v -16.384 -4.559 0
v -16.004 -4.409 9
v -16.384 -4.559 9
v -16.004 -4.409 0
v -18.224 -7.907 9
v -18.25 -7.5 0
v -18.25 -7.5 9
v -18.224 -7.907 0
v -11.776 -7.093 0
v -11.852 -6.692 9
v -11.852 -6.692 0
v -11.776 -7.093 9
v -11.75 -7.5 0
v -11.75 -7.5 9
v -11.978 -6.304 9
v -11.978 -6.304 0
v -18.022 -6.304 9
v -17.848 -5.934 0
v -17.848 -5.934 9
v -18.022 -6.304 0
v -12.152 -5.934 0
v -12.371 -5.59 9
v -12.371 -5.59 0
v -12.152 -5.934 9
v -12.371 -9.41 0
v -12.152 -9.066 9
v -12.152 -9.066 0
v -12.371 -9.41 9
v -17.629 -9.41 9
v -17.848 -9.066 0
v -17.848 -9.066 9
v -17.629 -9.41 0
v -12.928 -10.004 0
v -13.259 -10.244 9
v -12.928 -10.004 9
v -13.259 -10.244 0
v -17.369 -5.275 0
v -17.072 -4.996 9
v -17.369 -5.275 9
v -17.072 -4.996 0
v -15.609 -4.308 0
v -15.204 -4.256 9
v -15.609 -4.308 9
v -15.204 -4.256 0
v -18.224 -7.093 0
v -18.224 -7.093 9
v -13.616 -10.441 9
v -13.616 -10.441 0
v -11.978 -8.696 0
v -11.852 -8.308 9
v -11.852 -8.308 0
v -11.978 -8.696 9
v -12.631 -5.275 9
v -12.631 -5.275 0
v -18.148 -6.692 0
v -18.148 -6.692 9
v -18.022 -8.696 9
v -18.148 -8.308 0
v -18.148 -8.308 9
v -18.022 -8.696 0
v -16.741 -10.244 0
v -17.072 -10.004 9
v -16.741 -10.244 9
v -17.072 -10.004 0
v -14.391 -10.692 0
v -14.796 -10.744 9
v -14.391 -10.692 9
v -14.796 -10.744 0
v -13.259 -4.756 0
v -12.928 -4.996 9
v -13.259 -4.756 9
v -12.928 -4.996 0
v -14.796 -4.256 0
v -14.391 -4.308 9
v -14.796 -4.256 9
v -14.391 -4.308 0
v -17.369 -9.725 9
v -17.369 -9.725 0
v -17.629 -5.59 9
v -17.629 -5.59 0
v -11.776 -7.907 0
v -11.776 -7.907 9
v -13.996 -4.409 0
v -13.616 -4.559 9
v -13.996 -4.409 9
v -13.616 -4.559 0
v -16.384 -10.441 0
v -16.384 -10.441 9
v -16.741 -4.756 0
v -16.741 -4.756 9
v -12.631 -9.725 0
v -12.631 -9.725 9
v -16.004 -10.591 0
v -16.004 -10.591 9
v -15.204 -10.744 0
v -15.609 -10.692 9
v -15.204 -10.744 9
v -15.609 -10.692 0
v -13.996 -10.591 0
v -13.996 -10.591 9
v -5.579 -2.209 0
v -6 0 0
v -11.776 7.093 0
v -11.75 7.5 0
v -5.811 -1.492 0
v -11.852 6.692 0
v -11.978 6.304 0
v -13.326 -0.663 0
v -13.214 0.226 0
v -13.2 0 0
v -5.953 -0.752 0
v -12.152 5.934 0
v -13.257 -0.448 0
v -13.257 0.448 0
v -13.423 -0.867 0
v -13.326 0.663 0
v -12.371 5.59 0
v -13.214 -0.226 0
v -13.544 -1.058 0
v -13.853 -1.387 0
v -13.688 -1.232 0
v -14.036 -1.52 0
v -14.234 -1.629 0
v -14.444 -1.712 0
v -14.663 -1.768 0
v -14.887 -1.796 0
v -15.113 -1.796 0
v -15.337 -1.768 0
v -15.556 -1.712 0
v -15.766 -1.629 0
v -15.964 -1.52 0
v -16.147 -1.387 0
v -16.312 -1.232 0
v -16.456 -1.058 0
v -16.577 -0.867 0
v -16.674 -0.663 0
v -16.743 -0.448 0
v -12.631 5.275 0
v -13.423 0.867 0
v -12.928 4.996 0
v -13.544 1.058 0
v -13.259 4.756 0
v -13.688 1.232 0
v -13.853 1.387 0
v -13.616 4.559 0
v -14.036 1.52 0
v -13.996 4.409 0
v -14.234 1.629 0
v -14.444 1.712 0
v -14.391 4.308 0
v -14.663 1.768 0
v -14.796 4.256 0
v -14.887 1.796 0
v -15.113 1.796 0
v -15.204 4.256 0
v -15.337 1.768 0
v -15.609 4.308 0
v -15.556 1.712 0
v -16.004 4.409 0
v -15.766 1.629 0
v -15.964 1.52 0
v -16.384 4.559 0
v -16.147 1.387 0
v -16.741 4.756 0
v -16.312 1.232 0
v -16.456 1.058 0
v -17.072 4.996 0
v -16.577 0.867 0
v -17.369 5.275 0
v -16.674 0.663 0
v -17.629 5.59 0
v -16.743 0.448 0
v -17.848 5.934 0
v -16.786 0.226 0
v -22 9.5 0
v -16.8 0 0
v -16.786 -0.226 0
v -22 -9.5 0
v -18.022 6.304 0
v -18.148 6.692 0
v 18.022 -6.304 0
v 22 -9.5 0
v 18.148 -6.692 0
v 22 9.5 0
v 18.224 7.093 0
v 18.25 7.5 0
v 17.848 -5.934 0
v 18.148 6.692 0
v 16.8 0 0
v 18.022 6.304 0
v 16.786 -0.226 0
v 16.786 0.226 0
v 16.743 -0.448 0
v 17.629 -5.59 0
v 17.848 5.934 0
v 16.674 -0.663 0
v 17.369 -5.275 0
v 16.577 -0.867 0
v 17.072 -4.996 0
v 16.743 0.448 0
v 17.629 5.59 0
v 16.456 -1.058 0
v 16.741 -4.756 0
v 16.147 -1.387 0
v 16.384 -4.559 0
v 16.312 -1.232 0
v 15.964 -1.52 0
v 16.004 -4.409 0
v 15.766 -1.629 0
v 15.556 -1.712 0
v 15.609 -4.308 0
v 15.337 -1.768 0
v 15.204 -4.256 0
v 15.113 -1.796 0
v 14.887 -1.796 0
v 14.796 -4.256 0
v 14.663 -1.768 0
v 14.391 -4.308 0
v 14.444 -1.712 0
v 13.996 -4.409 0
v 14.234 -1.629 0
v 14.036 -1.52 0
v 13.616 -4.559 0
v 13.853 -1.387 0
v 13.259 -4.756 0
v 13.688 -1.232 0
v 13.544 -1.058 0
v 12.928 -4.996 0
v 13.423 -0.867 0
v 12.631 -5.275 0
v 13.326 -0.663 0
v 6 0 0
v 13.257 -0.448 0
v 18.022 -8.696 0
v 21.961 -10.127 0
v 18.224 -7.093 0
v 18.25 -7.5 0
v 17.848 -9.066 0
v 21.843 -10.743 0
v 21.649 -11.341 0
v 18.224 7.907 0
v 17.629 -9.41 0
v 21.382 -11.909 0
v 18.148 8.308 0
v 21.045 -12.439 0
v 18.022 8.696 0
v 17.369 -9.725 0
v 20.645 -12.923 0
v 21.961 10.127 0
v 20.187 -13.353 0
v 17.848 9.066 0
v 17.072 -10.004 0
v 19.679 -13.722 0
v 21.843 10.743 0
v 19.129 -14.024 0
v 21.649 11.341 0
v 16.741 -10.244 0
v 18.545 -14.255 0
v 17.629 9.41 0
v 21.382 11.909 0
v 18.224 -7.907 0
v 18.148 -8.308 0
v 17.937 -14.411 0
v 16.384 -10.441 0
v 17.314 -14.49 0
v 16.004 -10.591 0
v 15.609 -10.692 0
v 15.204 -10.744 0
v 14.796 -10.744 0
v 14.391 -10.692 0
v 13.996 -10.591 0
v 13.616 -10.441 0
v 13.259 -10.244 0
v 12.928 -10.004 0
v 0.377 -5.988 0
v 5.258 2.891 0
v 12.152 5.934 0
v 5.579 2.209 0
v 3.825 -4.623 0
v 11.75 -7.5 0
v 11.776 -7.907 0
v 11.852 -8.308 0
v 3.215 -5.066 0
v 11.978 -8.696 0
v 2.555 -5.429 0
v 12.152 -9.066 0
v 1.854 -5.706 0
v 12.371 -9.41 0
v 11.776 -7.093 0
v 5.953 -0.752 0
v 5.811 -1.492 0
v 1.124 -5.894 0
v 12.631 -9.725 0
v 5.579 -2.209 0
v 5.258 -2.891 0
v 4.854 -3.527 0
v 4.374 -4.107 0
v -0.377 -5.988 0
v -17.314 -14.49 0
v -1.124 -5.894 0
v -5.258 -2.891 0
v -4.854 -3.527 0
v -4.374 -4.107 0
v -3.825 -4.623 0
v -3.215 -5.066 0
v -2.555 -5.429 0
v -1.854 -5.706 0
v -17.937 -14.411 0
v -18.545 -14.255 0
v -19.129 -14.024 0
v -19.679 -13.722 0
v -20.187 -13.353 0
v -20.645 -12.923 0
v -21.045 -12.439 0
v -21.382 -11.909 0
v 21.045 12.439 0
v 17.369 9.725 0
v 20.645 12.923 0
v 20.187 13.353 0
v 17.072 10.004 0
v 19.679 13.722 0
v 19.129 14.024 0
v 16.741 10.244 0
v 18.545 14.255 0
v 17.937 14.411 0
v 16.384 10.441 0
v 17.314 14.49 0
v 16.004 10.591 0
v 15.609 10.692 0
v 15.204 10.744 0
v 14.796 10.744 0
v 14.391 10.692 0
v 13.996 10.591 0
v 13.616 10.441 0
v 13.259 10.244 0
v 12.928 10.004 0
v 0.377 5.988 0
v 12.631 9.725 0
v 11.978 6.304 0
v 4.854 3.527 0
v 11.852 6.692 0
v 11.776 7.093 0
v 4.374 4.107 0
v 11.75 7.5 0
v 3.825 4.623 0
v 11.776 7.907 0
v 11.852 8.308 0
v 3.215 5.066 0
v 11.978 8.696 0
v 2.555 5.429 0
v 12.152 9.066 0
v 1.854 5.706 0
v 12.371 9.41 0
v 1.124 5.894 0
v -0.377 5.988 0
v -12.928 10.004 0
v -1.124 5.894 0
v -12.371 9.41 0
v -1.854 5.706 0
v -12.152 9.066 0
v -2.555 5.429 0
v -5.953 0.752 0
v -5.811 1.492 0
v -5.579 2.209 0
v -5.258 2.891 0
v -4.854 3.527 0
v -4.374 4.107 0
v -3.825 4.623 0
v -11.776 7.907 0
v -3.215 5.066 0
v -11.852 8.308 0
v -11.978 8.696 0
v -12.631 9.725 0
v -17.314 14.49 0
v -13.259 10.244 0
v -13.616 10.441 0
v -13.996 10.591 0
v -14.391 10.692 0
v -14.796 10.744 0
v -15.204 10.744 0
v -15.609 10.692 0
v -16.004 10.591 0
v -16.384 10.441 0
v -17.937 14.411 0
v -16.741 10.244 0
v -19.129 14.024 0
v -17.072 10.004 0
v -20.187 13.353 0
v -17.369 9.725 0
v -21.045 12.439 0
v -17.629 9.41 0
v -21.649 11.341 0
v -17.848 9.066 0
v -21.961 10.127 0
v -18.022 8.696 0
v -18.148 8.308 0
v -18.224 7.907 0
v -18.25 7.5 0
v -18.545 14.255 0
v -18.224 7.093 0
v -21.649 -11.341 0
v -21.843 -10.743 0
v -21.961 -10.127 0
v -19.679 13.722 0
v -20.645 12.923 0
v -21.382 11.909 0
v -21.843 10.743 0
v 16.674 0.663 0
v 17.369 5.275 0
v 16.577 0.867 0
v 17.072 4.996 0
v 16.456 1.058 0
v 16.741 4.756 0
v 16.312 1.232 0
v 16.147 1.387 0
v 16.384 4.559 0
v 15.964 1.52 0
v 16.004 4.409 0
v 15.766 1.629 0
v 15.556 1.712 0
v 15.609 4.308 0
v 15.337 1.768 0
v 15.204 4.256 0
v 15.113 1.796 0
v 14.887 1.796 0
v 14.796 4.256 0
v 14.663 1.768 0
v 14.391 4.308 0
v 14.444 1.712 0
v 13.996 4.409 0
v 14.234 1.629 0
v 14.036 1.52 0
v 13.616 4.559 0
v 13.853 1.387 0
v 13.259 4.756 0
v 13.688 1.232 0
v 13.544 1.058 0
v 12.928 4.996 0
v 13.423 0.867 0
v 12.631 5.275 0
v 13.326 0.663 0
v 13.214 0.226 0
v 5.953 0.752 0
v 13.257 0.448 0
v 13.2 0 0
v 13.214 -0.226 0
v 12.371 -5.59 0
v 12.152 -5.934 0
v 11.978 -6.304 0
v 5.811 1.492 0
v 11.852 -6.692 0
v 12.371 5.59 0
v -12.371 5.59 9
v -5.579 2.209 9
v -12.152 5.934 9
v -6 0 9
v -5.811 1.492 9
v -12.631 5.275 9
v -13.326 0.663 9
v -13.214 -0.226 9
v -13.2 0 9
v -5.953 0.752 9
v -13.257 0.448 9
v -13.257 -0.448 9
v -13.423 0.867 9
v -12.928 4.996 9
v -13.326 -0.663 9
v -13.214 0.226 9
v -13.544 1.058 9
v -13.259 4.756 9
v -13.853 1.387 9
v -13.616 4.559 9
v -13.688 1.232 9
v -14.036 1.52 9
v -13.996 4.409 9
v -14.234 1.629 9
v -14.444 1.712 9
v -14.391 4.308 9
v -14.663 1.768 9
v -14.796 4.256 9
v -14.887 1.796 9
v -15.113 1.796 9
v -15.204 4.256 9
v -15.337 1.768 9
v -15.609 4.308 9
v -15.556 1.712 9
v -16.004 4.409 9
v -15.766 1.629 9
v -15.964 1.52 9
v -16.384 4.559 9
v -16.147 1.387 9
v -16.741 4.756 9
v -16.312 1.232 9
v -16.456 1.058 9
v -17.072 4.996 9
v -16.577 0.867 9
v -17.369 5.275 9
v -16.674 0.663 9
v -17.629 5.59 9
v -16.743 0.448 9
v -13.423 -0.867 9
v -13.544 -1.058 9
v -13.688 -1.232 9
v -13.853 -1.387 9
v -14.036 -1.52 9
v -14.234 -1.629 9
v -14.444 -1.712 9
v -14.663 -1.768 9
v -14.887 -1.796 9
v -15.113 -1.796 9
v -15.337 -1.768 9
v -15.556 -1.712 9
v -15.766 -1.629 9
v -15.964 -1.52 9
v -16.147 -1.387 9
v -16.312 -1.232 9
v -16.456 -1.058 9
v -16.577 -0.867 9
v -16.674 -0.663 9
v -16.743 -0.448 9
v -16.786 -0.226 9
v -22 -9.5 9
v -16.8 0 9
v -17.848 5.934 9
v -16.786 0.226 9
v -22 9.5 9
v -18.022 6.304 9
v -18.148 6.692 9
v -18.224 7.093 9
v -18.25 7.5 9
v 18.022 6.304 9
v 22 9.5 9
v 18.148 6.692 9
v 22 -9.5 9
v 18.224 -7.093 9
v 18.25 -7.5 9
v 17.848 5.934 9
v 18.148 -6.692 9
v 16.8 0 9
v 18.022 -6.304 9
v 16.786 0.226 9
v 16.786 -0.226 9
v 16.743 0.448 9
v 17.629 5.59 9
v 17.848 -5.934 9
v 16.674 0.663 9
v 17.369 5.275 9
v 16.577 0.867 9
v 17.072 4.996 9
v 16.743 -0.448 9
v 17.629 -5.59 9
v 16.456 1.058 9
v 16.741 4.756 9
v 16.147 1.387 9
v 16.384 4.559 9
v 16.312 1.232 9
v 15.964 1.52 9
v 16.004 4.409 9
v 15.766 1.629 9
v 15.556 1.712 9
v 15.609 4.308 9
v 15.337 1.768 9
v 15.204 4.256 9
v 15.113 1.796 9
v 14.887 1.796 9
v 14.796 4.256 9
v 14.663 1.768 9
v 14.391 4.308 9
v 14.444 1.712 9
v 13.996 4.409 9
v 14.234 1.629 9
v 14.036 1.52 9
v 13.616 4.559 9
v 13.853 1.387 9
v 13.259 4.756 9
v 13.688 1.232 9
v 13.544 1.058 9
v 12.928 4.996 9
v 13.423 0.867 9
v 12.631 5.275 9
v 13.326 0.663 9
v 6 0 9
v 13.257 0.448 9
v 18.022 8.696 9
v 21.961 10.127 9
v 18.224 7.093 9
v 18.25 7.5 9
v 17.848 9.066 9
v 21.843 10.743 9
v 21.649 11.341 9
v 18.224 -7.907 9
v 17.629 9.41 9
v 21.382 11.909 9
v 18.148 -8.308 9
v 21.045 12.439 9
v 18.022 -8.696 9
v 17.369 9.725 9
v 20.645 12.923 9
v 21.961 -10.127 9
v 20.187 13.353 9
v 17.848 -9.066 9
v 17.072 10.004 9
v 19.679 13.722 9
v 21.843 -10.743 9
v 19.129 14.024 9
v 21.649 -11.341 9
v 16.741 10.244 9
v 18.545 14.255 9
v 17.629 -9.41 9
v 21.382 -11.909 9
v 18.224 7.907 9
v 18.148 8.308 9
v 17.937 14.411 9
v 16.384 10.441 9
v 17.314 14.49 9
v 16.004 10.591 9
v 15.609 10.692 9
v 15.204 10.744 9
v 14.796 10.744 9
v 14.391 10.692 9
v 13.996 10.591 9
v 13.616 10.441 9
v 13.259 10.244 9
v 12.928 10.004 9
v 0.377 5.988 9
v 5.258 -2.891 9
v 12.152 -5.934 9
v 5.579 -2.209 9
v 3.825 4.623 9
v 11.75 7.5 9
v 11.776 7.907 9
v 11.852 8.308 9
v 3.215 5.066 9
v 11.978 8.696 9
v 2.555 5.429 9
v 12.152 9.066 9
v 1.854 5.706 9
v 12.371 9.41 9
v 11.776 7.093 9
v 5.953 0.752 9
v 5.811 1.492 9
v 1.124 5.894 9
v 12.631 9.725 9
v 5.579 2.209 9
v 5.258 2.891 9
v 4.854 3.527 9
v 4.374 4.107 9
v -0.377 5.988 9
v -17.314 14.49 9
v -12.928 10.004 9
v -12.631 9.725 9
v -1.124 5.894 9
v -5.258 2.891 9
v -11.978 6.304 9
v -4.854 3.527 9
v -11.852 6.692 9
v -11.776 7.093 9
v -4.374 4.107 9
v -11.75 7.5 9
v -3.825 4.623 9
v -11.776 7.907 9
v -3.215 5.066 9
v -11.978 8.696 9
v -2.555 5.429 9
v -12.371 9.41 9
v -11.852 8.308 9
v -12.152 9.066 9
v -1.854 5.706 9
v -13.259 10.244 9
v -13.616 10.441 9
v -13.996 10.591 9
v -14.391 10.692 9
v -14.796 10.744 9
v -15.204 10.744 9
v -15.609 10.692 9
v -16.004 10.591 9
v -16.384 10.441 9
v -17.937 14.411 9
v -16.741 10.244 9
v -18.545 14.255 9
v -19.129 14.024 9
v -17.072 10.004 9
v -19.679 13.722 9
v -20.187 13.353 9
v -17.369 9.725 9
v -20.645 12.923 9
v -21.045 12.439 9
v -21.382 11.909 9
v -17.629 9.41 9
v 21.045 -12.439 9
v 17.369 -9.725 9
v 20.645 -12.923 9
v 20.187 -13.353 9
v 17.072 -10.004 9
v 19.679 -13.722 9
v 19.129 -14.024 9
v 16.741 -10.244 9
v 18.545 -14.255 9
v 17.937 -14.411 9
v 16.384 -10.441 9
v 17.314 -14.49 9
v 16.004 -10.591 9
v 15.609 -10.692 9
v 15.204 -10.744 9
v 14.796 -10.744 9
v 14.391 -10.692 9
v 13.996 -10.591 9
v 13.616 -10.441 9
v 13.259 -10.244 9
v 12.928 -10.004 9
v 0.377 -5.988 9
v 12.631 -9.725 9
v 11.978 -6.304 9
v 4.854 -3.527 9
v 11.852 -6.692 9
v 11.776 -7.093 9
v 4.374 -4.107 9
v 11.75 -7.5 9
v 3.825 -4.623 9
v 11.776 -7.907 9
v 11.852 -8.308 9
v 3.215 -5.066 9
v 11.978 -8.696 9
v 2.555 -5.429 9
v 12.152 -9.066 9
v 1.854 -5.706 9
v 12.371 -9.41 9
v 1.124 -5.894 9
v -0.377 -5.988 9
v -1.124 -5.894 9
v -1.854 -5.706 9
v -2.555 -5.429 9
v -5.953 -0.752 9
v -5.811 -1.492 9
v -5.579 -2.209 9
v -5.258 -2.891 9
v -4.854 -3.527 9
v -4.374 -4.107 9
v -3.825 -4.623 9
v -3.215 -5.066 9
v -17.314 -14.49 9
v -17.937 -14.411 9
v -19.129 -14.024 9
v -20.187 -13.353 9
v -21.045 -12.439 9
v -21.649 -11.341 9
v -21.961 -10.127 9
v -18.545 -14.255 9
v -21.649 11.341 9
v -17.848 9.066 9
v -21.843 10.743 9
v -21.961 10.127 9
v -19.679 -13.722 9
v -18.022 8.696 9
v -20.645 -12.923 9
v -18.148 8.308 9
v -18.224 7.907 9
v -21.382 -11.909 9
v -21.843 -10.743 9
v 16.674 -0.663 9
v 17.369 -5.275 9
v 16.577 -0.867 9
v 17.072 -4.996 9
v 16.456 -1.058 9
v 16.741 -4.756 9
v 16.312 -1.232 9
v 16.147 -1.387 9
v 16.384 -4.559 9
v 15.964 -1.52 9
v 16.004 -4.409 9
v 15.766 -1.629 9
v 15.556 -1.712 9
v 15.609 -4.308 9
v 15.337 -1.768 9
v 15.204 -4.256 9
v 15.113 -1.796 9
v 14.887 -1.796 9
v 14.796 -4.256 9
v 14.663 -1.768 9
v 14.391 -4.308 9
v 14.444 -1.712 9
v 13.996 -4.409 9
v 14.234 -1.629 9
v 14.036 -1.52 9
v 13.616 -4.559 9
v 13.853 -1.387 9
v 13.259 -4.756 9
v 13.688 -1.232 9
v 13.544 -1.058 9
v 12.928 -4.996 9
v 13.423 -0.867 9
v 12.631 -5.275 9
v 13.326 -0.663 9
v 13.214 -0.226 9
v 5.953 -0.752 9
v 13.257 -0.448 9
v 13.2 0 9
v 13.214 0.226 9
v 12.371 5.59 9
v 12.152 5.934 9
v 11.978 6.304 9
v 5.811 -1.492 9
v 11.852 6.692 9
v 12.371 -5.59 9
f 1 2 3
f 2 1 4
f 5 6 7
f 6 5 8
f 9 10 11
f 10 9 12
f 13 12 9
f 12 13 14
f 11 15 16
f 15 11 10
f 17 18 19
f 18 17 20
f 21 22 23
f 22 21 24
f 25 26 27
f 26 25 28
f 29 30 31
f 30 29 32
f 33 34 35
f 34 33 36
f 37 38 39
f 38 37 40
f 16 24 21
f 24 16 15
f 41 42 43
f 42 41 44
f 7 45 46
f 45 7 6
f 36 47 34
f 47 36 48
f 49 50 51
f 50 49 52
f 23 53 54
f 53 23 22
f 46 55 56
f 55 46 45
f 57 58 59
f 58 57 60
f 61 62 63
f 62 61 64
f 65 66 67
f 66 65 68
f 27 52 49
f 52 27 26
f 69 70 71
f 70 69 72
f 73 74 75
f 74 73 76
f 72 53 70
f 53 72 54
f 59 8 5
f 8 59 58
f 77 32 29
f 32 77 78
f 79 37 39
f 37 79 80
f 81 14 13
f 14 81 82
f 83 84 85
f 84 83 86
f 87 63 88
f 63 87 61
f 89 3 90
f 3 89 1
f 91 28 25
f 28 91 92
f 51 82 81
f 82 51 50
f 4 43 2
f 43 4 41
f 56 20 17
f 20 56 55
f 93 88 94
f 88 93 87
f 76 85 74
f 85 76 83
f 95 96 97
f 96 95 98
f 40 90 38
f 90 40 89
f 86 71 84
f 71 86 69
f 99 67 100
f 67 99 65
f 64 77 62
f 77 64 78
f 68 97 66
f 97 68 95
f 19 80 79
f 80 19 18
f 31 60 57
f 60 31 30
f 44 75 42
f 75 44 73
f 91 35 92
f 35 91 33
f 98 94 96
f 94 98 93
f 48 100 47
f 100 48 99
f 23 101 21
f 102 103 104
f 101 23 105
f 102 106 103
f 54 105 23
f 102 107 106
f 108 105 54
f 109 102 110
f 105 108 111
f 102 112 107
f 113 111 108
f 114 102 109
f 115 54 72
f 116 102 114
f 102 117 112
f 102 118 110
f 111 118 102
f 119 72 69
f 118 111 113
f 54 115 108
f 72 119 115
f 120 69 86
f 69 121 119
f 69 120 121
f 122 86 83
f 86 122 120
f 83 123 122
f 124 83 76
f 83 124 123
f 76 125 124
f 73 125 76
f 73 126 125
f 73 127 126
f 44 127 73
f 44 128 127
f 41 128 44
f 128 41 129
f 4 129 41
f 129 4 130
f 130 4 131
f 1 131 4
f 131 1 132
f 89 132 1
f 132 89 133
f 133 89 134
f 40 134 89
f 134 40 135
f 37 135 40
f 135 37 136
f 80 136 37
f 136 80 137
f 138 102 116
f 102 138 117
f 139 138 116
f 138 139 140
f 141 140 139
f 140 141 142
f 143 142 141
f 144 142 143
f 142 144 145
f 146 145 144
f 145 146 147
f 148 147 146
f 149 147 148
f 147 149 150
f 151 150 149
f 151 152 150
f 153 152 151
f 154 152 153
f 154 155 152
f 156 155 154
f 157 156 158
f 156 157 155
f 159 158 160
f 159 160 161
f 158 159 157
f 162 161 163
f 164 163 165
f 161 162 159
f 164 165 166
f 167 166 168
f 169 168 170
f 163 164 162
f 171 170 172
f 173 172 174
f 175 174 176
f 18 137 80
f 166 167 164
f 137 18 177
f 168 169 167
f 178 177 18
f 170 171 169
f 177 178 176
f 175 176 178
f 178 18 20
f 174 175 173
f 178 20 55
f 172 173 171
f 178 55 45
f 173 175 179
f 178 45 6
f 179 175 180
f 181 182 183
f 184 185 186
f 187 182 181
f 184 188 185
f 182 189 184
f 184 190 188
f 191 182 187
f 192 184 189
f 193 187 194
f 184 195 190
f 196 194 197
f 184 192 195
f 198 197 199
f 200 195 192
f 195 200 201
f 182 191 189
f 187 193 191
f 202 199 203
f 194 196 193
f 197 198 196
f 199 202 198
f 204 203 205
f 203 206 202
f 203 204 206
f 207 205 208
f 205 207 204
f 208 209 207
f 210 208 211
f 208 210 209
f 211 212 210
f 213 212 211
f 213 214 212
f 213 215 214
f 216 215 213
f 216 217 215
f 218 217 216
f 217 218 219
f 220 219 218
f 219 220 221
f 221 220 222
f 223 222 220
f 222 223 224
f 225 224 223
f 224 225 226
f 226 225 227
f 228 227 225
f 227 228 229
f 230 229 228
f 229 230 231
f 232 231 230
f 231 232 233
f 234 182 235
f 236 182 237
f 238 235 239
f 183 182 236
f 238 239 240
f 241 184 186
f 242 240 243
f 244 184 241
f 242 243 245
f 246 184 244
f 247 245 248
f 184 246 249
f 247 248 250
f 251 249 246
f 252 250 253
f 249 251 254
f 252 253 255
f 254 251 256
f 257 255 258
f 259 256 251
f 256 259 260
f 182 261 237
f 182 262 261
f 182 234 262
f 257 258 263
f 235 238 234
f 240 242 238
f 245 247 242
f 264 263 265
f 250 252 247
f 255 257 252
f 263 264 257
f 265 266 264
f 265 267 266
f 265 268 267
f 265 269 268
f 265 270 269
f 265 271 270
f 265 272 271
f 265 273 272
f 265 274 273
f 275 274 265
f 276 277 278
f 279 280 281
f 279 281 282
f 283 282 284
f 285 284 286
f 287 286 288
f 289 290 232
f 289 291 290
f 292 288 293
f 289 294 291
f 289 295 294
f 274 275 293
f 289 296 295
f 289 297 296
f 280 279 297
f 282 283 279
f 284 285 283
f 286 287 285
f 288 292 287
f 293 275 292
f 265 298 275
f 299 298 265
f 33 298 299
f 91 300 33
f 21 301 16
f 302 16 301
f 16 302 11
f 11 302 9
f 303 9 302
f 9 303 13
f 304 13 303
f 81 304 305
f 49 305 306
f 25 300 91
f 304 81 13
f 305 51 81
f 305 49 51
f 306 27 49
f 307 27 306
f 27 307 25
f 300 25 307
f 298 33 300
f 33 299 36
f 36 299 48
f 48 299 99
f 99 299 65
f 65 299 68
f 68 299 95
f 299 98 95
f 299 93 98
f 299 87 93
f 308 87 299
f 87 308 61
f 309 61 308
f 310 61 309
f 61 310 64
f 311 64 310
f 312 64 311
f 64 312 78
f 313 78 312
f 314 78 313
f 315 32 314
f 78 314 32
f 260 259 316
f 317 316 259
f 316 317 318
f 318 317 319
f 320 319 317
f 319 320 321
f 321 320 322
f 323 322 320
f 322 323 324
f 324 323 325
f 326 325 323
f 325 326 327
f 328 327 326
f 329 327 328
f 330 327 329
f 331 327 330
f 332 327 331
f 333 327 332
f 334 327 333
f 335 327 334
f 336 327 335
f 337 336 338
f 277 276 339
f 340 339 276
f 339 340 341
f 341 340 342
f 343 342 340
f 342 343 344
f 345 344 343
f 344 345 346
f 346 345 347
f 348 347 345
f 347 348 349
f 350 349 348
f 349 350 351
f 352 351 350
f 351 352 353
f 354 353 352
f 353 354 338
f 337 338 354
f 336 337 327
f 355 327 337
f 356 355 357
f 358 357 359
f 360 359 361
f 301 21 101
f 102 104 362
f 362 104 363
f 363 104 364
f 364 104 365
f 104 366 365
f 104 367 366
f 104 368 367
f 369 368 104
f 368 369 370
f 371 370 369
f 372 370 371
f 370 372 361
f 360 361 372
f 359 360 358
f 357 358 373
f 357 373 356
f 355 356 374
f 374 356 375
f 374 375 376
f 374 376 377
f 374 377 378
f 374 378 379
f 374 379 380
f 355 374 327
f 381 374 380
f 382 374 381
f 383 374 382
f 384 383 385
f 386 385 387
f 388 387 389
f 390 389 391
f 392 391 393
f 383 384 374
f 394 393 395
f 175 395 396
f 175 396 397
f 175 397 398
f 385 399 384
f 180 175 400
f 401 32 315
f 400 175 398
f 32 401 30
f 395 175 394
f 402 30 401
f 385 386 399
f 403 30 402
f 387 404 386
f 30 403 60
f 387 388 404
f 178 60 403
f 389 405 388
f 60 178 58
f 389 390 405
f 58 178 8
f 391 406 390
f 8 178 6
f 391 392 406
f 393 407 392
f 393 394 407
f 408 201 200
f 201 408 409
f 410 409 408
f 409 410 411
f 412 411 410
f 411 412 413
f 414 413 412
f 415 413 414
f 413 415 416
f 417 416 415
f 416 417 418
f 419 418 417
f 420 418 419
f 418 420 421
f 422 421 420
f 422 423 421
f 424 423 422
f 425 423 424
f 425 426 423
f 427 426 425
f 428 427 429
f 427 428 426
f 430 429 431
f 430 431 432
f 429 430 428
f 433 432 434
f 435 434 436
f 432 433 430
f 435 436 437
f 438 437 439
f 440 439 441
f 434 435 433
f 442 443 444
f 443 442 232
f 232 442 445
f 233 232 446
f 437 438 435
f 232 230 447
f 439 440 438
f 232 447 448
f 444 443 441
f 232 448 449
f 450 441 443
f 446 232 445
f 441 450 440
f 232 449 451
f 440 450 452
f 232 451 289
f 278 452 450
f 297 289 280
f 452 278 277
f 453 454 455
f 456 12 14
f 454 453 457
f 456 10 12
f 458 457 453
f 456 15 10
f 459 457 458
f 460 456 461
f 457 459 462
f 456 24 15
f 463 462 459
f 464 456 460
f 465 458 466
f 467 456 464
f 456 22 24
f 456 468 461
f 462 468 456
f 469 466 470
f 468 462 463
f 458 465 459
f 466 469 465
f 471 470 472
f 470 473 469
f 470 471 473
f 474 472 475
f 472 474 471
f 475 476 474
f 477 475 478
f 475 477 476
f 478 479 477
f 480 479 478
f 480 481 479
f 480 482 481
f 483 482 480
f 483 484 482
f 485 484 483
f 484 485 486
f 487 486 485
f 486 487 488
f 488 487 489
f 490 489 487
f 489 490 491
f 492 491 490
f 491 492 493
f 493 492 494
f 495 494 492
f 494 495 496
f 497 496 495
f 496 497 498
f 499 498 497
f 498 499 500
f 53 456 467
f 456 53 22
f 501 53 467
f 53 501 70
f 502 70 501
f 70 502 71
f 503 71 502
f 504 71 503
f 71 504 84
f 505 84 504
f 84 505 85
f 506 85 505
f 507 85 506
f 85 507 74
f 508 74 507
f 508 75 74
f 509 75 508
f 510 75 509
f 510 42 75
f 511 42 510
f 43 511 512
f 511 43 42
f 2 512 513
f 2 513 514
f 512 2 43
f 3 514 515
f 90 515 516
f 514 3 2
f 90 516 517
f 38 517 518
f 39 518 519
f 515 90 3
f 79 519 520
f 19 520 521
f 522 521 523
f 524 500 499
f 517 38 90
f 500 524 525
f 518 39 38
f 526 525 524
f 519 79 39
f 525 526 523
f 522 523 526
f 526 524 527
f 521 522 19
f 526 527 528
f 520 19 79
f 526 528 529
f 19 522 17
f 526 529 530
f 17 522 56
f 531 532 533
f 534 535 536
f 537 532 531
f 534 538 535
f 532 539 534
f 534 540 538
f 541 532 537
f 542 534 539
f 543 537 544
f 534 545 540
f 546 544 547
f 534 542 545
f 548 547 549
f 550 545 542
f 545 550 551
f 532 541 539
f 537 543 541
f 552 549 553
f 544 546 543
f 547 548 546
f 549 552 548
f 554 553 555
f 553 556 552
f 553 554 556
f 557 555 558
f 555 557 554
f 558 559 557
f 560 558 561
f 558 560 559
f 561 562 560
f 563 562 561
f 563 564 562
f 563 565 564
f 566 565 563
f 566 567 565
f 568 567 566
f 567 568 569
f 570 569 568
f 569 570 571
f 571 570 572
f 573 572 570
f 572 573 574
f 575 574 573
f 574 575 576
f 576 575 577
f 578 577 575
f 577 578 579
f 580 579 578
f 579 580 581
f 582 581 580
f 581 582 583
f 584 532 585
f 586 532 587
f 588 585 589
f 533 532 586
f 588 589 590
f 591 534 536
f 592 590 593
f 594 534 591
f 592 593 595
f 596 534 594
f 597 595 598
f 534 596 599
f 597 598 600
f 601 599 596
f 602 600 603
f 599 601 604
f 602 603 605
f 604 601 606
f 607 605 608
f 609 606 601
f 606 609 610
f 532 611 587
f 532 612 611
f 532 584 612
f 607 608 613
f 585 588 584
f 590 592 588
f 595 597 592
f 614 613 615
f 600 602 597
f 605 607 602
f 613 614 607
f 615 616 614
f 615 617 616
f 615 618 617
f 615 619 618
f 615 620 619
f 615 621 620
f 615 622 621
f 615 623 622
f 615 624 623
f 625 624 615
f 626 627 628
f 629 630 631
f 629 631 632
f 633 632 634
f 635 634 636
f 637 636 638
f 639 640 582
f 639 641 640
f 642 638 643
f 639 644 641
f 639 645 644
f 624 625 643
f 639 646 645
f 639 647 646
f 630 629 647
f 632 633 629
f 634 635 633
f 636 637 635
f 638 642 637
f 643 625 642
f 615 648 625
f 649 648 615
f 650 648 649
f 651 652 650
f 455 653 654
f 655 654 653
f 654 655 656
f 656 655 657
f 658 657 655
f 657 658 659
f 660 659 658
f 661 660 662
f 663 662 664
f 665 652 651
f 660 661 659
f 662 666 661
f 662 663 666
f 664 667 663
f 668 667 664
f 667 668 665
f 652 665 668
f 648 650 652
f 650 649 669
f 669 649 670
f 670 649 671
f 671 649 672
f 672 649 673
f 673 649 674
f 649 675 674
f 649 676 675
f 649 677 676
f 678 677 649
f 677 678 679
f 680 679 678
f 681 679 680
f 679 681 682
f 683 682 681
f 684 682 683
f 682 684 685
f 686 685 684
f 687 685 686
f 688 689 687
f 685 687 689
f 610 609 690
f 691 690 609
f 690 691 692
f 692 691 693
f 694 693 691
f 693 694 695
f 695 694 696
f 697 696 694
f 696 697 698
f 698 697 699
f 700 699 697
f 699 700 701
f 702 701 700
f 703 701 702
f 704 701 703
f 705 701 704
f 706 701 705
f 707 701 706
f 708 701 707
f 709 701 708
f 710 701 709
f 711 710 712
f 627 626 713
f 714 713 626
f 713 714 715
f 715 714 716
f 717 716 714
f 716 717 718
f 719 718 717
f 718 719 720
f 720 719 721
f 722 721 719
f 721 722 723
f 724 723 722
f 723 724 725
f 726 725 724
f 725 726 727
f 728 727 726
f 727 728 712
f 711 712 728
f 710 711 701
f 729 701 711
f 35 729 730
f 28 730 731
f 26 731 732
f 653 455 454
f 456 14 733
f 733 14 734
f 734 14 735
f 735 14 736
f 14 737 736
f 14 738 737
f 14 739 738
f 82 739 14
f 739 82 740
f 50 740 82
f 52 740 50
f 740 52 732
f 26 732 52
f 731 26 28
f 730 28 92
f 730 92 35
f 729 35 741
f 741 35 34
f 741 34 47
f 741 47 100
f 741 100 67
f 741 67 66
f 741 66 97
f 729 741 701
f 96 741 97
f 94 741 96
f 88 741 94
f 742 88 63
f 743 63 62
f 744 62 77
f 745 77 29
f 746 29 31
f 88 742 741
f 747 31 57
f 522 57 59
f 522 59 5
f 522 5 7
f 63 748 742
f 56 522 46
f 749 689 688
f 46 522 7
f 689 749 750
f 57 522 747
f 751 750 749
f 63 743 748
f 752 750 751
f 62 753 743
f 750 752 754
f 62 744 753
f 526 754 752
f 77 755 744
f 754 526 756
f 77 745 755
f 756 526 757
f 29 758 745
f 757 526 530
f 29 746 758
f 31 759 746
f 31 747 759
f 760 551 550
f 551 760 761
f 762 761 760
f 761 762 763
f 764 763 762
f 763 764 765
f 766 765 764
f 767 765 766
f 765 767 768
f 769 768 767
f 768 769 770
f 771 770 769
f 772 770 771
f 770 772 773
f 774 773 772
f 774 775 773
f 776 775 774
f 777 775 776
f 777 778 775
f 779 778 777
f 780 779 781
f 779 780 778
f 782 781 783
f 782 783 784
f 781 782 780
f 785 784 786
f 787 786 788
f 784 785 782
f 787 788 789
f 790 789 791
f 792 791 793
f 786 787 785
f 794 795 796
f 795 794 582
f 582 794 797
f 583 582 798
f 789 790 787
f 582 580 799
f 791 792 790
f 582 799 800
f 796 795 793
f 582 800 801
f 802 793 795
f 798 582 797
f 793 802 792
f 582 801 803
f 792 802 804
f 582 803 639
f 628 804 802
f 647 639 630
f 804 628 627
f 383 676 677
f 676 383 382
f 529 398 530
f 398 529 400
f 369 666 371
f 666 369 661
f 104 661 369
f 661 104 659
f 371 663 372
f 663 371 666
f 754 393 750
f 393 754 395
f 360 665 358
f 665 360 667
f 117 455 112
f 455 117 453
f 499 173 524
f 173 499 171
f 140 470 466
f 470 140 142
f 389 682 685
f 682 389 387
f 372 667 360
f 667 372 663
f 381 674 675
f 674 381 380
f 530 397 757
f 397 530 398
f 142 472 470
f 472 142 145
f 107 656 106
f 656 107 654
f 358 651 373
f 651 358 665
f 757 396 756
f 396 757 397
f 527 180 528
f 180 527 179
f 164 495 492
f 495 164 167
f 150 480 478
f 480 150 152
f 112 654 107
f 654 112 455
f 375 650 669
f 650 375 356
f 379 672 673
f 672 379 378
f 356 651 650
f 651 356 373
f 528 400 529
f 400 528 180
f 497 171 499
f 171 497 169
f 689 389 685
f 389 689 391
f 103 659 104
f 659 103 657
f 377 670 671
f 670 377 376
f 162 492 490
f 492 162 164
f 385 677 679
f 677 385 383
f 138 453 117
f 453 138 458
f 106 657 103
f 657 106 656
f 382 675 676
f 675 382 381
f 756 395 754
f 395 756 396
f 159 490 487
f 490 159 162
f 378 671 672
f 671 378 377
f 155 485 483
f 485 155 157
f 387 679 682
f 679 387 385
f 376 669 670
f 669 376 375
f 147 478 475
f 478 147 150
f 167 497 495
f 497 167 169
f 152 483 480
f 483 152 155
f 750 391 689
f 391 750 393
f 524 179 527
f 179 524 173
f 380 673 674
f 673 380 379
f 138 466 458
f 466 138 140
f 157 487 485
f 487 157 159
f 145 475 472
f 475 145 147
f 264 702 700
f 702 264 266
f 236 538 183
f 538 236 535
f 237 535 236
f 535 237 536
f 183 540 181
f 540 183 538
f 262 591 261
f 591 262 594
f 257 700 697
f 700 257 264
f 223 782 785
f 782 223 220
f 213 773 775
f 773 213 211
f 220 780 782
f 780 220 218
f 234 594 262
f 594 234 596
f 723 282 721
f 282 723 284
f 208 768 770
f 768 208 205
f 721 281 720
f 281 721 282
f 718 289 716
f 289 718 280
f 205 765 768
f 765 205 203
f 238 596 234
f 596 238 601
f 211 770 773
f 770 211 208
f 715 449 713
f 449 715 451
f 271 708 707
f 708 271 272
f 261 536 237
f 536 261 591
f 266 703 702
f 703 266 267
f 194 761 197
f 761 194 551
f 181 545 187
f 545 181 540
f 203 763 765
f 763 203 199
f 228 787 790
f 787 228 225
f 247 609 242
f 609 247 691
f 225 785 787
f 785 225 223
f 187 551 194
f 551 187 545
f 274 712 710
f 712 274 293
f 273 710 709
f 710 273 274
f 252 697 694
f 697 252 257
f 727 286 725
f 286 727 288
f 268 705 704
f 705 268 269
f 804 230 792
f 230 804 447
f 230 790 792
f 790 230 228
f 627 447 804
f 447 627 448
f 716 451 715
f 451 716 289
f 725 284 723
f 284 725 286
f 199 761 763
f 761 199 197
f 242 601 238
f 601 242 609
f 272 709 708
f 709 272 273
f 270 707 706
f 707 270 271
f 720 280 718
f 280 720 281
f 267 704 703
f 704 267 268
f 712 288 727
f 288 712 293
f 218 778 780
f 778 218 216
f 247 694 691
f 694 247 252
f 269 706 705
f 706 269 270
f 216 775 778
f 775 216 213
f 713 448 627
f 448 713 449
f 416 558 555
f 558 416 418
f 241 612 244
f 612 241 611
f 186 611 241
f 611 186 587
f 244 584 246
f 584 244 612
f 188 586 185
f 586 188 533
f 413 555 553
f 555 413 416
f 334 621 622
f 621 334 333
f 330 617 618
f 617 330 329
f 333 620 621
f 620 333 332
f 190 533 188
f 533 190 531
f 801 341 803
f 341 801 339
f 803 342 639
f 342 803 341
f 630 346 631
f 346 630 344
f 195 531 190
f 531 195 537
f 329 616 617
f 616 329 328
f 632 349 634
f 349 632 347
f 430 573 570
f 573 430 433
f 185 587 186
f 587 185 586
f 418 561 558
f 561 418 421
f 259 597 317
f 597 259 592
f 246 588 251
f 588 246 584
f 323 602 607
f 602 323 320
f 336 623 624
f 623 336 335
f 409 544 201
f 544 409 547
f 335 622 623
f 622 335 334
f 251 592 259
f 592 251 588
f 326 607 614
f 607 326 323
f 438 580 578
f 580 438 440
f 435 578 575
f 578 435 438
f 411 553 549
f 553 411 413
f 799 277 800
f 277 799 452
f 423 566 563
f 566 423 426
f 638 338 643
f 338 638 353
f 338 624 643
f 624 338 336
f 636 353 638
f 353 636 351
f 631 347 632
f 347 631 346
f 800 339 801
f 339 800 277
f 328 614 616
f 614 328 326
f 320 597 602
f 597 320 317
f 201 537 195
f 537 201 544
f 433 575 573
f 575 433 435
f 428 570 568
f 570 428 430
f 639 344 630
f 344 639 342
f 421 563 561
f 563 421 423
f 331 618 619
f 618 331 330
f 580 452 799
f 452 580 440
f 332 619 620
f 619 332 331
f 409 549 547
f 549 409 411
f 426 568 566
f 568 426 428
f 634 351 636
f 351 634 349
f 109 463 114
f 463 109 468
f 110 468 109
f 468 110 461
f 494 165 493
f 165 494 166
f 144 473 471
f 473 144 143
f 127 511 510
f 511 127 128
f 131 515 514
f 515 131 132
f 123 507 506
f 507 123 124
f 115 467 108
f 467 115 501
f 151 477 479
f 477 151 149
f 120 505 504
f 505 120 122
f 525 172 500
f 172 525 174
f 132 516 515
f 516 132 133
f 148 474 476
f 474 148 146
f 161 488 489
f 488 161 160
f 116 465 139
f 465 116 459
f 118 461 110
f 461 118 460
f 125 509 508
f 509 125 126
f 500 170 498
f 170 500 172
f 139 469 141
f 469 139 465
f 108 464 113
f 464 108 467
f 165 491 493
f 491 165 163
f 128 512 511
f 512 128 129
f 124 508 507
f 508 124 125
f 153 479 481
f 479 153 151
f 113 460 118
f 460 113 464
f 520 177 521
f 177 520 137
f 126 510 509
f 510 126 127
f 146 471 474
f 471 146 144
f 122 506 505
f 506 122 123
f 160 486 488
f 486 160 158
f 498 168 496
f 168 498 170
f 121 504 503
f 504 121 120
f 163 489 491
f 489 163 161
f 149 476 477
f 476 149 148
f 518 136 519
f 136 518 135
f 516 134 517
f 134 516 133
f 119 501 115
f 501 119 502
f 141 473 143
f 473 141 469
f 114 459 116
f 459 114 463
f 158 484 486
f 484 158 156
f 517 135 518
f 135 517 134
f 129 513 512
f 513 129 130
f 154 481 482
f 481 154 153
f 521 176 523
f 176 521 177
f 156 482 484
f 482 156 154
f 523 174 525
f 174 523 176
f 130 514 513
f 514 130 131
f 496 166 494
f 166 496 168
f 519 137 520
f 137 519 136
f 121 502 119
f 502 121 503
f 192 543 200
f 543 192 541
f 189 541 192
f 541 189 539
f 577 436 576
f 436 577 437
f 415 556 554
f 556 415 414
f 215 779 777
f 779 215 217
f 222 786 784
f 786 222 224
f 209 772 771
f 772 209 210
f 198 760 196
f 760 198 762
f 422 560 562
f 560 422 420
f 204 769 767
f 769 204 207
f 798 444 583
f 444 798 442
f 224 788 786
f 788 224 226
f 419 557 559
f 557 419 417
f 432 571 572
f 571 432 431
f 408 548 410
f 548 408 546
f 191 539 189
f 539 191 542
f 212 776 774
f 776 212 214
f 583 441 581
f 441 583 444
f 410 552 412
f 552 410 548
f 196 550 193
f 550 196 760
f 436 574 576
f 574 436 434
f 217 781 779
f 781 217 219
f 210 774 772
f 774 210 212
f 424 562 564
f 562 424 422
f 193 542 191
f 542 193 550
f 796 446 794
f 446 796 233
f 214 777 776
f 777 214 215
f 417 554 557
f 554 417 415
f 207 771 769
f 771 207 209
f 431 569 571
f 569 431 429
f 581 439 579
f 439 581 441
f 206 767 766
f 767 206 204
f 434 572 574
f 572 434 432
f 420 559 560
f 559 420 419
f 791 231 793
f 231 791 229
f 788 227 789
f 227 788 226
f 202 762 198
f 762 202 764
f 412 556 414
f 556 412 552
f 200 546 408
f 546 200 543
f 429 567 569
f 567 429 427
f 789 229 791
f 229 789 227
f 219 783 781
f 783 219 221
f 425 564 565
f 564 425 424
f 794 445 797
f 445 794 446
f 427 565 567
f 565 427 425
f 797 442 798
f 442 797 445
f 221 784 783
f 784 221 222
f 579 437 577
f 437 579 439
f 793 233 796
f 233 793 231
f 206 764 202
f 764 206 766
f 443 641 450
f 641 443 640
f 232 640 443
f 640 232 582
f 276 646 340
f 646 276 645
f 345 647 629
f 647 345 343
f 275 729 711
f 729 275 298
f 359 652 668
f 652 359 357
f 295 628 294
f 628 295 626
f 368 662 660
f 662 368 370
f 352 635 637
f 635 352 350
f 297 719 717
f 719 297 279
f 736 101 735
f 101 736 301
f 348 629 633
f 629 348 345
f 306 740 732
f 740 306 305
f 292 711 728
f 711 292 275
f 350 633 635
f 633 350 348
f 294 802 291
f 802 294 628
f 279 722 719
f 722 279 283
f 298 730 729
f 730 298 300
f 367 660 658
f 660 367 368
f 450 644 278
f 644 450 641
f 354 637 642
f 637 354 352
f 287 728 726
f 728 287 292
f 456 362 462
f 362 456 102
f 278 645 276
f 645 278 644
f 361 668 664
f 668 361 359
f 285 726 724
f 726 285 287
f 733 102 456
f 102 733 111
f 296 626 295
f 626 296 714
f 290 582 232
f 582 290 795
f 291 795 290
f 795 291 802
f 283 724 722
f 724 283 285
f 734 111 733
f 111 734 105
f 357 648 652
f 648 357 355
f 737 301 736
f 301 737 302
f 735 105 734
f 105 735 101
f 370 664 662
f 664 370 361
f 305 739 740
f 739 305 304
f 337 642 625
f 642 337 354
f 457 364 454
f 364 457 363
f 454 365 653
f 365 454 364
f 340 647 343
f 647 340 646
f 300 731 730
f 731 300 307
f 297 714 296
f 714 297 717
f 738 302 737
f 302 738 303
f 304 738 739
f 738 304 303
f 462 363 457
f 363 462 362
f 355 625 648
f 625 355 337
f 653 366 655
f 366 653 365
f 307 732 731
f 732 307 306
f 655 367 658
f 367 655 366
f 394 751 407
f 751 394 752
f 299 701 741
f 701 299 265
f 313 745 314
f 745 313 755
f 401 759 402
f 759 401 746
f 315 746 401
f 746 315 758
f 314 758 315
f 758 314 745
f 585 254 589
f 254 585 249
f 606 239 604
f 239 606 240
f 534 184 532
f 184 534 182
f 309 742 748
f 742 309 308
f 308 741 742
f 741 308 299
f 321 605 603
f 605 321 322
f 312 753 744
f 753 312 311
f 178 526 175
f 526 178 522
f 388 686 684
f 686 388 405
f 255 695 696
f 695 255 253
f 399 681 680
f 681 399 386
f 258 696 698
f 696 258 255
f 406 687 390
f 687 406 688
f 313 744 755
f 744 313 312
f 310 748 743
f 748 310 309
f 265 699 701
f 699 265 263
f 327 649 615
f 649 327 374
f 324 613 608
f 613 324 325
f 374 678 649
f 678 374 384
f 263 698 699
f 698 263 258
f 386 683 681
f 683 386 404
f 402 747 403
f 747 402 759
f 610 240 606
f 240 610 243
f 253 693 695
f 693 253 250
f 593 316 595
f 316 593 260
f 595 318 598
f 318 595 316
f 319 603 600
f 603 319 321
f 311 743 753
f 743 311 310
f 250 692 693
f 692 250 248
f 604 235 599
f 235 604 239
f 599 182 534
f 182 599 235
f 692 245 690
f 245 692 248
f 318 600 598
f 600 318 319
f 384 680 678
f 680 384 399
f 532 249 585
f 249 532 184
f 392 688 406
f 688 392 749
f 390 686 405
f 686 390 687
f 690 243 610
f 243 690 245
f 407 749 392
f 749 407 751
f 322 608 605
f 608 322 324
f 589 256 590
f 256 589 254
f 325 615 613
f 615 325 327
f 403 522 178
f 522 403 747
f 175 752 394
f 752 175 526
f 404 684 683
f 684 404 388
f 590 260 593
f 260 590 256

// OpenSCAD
$fn = 50;

difference() {
	union() {
		hull() {
			translate(v = [-17.0, 9.5, 0]) {
				cylinder(h = 9, r = 5);
			}
			translate(v = [17.0, 9.5, 0]) {
				cylinder(h = 9, r = 5);
			}
			translate(v = [-17.0, -9.5, 0]) {
				cylinder(h = 9, r = 5);
			}
			translate(v = [17.0, -9.5, 0]) {
				cylinder(h = 9, r = 5);
			}
		}
	}
	union() {
		translate(v = [-15.0, -7.5, 0]) {
			cylinder(h = 9, r = 3.25);
		}
		translate(v = [-15.0, 7.5, 0]) {
			cylinder(h = 9, r = 3.25);
		}
		translate(v = [15.0, -7.5, 0]) {
			cylinder(h = 9, r = 3.25);
		}
		translate(v = [15.0, 7.5, 0]) {
			cylinder(h = 9, r = 3.25);
		}
		translate(v = [-15.0, 0.0, 0]) {
			cylinder(h = 9, r = 1.8);
		}
		translate(v = [15.0, 0.0, 0]) {
			cylinder(h = 9, r = 1.8);
		}
		cylinder(h = 9, r = 6.0);
	}
}
